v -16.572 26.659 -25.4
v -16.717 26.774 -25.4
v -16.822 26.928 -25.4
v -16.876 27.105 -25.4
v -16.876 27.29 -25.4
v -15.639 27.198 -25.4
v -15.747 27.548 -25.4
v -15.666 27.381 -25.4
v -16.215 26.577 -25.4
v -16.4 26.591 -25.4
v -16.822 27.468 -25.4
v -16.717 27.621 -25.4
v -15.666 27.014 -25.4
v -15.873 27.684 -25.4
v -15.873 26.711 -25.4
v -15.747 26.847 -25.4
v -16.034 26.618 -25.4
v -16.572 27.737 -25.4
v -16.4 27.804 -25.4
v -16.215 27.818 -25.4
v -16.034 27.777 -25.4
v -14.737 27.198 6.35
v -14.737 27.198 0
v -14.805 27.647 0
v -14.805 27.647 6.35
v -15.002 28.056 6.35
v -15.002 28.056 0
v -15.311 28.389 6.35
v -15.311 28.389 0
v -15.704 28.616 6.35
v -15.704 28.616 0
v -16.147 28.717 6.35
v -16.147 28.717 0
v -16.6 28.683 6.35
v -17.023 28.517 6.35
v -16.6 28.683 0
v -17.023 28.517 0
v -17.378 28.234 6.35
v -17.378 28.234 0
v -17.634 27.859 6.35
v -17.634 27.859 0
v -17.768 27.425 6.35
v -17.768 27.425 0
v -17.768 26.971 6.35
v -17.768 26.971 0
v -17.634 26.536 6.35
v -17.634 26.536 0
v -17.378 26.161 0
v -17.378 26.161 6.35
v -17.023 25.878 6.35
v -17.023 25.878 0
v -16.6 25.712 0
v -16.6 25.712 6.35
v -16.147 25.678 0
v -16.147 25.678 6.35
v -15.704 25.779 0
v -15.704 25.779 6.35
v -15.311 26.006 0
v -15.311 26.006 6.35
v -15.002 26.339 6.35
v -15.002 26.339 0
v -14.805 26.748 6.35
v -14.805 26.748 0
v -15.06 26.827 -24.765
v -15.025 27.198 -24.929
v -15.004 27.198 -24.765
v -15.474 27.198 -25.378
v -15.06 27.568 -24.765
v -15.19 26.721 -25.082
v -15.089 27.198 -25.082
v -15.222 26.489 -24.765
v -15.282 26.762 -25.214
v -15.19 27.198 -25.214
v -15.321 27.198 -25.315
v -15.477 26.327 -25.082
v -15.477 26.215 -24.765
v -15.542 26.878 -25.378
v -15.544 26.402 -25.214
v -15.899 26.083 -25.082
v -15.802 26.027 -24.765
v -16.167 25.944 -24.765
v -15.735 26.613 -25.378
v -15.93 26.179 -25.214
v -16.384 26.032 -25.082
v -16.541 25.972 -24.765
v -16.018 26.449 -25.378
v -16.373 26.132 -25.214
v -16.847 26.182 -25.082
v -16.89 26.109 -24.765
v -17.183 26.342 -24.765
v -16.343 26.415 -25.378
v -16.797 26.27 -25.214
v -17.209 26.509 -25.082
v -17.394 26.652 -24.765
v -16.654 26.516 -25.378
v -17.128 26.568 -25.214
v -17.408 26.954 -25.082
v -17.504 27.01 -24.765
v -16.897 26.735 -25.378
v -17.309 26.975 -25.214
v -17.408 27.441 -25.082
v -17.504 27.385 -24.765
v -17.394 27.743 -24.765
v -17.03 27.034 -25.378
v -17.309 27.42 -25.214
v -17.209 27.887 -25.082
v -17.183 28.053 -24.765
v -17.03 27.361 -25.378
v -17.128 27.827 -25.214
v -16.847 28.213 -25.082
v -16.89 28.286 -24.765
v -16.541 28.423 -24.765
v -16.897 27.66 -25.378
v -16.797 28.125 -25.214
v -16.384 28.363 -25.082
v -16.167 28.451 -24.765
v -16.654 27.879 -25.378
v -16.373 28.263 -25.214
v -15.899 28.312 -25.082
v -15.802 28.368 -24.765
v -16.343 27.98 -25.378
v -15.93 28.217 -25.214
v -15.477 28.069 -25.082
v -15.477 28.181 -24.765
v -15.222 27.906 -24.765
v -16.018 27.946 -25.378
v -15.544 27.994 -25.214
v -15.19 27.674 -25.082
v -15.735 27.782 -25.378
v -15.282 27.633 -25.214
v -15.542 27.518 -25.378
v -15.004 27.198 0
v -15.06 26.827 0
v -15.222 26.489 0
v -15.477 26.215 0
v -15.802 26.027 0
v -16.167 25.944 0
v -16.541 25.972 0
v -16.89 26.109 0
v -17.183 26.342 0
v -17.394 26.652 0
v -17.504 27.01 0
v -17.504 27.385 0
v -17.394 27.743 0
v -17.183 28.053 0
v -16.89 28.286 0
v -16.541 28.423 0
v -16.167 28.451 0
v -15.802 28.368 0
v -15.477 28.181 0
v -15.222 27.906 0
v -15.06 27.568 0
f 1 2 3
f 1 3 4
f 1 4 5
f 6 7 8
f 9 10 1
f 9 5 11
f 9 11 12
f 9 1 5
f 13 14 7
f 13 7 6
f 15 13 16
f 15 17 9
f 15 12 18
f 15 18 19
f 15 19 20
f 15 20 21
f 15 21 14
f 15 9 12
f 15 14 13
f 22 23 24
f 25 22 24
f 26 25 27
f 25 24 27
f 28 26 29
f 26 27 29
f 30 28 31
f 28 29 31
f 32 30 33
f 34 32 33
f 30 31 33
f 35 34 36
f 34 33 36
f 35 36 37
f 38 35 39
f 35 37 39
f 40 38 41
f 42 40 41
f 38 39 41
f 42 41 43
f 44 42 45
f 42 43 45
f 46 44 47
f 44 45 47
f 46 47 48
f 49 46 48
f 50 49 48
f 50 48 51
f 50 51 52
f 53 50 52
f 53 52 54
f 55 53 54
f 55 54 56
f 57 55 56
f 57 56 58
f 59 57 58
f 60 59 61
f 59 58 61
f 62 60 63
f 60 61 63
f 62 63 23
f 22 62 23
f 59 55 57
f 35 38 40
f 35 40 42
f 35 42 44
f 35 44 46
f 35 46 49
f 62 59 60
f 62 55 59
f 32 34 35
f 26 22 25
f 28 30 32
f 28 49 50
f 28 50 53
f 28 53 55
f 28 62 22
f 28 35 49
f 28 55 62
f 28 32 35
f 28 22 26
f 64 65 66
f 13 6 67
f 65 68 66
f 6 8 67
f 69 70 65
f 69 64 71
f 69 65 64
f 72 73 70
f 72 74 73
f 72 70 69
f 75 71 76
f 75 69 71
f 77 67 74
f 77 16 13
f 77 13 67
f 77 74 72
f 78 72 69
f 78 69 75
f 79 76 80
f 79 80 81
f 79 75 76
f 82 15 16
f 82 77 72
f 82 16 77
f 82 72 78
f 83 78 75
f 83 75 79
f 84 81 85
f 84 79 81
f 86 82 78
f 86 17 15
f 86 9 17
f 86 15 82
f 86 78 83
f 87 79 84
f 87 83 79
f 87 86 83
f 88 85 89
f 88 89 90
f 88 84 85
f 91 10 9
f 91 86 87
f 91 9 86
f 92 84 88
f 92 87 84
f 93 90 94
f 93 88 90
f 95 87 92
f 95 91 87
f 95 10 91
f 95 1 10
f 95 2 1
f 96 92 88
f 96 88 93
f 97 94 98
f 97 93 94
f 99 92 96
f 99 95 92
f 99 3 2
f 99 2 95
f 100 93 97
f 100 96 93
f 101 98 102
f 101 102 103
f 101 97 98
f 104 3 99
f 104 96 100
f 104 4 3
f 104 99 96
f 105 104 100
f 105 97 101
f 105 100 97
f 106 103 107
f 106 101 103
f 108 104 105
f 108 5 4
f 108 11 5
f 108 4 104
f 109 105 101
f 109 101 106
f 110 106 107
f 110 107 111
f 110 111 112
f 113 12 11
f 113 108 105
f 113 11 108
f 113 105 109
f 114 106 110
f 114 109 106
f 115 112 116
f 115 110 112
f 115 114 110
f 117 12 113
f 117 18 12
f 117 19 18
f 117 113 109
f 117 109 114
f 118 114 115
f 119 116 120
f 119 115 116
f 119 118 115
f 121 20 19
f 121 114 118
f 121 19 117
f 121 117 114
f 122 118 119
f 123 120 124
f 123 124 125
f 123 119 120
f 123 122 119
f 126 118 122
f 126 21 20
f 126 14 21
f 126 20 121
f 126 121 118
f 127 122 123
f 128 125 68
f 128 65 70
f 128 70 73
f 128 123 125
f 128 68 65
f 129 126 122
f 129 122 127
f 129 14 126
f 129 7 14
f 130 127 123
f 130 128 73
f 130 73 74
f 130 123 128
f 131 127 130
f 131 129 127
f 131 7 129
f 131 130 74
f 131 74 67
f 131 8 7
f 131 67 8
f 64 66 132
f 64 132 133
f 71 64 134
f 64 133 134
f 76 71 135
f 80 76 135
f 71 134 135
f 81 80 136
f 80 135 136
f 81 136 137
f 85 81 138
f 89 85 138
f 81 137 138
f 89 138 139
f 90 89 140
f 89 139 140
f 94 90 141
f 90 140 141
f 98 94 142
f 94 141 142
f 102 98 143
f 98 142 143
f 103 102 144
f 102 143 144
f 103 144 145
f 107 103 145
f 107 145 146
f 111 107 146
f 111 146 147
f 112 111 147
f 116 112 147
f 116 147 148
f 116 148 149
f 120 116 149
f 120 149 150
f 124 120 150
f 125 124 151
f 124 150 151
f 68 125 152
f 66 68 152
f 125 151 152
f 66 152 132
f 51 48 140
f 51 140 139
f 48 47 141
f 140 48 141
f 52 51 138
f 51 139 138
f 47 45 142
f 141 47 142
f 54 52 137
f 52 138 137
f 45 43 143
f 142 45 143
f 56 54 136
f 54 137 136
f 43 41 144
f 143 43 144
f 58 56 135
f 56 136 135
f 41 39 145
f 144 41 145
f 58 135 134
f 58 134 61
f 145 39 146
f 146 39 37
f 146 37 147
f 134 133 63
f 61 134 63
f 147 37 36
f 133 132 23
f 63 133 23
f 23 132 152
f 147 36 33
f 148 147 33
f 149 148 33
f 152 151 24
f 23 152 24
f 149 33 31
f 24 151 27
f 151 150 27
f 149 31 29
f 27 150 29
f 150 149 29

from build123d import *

# Parameters (mm, degrees)
F0_R     = 1.524
F1_DEPTH = 6.35
F2_R     = 1.2573
F3_DEPTH = 25.4
F4_R     = 0.635


with BuildPart() as f1:
    # F0 (on Top) → F1 (new body)
    with BuildSketch(Plane.XY):
        with Locations((-16.261026, 27.197644)):
            Circle(F0_R)
    extrude(amount=F1_DEPTH)

    # F2 (on face) → F3 (join)
    with BuildSketch(Plane(origin=(0, 0, 0), x_dir=(1, 0, 0), z_dir=(0, 0, -1))):
        with Locations((-16.261026, -27.197644)):
            Circle(F2_R)
    extrude(amount=F3_DEPTH)

    # F4
    f4_edges = [f1.edges().sort_by_distance(p)[0] for p in [
        (-17.518326, 27.197644, -25.4),
    ]]
    fillet(f4_edges, radius=F4_R)


solid = f1.part
